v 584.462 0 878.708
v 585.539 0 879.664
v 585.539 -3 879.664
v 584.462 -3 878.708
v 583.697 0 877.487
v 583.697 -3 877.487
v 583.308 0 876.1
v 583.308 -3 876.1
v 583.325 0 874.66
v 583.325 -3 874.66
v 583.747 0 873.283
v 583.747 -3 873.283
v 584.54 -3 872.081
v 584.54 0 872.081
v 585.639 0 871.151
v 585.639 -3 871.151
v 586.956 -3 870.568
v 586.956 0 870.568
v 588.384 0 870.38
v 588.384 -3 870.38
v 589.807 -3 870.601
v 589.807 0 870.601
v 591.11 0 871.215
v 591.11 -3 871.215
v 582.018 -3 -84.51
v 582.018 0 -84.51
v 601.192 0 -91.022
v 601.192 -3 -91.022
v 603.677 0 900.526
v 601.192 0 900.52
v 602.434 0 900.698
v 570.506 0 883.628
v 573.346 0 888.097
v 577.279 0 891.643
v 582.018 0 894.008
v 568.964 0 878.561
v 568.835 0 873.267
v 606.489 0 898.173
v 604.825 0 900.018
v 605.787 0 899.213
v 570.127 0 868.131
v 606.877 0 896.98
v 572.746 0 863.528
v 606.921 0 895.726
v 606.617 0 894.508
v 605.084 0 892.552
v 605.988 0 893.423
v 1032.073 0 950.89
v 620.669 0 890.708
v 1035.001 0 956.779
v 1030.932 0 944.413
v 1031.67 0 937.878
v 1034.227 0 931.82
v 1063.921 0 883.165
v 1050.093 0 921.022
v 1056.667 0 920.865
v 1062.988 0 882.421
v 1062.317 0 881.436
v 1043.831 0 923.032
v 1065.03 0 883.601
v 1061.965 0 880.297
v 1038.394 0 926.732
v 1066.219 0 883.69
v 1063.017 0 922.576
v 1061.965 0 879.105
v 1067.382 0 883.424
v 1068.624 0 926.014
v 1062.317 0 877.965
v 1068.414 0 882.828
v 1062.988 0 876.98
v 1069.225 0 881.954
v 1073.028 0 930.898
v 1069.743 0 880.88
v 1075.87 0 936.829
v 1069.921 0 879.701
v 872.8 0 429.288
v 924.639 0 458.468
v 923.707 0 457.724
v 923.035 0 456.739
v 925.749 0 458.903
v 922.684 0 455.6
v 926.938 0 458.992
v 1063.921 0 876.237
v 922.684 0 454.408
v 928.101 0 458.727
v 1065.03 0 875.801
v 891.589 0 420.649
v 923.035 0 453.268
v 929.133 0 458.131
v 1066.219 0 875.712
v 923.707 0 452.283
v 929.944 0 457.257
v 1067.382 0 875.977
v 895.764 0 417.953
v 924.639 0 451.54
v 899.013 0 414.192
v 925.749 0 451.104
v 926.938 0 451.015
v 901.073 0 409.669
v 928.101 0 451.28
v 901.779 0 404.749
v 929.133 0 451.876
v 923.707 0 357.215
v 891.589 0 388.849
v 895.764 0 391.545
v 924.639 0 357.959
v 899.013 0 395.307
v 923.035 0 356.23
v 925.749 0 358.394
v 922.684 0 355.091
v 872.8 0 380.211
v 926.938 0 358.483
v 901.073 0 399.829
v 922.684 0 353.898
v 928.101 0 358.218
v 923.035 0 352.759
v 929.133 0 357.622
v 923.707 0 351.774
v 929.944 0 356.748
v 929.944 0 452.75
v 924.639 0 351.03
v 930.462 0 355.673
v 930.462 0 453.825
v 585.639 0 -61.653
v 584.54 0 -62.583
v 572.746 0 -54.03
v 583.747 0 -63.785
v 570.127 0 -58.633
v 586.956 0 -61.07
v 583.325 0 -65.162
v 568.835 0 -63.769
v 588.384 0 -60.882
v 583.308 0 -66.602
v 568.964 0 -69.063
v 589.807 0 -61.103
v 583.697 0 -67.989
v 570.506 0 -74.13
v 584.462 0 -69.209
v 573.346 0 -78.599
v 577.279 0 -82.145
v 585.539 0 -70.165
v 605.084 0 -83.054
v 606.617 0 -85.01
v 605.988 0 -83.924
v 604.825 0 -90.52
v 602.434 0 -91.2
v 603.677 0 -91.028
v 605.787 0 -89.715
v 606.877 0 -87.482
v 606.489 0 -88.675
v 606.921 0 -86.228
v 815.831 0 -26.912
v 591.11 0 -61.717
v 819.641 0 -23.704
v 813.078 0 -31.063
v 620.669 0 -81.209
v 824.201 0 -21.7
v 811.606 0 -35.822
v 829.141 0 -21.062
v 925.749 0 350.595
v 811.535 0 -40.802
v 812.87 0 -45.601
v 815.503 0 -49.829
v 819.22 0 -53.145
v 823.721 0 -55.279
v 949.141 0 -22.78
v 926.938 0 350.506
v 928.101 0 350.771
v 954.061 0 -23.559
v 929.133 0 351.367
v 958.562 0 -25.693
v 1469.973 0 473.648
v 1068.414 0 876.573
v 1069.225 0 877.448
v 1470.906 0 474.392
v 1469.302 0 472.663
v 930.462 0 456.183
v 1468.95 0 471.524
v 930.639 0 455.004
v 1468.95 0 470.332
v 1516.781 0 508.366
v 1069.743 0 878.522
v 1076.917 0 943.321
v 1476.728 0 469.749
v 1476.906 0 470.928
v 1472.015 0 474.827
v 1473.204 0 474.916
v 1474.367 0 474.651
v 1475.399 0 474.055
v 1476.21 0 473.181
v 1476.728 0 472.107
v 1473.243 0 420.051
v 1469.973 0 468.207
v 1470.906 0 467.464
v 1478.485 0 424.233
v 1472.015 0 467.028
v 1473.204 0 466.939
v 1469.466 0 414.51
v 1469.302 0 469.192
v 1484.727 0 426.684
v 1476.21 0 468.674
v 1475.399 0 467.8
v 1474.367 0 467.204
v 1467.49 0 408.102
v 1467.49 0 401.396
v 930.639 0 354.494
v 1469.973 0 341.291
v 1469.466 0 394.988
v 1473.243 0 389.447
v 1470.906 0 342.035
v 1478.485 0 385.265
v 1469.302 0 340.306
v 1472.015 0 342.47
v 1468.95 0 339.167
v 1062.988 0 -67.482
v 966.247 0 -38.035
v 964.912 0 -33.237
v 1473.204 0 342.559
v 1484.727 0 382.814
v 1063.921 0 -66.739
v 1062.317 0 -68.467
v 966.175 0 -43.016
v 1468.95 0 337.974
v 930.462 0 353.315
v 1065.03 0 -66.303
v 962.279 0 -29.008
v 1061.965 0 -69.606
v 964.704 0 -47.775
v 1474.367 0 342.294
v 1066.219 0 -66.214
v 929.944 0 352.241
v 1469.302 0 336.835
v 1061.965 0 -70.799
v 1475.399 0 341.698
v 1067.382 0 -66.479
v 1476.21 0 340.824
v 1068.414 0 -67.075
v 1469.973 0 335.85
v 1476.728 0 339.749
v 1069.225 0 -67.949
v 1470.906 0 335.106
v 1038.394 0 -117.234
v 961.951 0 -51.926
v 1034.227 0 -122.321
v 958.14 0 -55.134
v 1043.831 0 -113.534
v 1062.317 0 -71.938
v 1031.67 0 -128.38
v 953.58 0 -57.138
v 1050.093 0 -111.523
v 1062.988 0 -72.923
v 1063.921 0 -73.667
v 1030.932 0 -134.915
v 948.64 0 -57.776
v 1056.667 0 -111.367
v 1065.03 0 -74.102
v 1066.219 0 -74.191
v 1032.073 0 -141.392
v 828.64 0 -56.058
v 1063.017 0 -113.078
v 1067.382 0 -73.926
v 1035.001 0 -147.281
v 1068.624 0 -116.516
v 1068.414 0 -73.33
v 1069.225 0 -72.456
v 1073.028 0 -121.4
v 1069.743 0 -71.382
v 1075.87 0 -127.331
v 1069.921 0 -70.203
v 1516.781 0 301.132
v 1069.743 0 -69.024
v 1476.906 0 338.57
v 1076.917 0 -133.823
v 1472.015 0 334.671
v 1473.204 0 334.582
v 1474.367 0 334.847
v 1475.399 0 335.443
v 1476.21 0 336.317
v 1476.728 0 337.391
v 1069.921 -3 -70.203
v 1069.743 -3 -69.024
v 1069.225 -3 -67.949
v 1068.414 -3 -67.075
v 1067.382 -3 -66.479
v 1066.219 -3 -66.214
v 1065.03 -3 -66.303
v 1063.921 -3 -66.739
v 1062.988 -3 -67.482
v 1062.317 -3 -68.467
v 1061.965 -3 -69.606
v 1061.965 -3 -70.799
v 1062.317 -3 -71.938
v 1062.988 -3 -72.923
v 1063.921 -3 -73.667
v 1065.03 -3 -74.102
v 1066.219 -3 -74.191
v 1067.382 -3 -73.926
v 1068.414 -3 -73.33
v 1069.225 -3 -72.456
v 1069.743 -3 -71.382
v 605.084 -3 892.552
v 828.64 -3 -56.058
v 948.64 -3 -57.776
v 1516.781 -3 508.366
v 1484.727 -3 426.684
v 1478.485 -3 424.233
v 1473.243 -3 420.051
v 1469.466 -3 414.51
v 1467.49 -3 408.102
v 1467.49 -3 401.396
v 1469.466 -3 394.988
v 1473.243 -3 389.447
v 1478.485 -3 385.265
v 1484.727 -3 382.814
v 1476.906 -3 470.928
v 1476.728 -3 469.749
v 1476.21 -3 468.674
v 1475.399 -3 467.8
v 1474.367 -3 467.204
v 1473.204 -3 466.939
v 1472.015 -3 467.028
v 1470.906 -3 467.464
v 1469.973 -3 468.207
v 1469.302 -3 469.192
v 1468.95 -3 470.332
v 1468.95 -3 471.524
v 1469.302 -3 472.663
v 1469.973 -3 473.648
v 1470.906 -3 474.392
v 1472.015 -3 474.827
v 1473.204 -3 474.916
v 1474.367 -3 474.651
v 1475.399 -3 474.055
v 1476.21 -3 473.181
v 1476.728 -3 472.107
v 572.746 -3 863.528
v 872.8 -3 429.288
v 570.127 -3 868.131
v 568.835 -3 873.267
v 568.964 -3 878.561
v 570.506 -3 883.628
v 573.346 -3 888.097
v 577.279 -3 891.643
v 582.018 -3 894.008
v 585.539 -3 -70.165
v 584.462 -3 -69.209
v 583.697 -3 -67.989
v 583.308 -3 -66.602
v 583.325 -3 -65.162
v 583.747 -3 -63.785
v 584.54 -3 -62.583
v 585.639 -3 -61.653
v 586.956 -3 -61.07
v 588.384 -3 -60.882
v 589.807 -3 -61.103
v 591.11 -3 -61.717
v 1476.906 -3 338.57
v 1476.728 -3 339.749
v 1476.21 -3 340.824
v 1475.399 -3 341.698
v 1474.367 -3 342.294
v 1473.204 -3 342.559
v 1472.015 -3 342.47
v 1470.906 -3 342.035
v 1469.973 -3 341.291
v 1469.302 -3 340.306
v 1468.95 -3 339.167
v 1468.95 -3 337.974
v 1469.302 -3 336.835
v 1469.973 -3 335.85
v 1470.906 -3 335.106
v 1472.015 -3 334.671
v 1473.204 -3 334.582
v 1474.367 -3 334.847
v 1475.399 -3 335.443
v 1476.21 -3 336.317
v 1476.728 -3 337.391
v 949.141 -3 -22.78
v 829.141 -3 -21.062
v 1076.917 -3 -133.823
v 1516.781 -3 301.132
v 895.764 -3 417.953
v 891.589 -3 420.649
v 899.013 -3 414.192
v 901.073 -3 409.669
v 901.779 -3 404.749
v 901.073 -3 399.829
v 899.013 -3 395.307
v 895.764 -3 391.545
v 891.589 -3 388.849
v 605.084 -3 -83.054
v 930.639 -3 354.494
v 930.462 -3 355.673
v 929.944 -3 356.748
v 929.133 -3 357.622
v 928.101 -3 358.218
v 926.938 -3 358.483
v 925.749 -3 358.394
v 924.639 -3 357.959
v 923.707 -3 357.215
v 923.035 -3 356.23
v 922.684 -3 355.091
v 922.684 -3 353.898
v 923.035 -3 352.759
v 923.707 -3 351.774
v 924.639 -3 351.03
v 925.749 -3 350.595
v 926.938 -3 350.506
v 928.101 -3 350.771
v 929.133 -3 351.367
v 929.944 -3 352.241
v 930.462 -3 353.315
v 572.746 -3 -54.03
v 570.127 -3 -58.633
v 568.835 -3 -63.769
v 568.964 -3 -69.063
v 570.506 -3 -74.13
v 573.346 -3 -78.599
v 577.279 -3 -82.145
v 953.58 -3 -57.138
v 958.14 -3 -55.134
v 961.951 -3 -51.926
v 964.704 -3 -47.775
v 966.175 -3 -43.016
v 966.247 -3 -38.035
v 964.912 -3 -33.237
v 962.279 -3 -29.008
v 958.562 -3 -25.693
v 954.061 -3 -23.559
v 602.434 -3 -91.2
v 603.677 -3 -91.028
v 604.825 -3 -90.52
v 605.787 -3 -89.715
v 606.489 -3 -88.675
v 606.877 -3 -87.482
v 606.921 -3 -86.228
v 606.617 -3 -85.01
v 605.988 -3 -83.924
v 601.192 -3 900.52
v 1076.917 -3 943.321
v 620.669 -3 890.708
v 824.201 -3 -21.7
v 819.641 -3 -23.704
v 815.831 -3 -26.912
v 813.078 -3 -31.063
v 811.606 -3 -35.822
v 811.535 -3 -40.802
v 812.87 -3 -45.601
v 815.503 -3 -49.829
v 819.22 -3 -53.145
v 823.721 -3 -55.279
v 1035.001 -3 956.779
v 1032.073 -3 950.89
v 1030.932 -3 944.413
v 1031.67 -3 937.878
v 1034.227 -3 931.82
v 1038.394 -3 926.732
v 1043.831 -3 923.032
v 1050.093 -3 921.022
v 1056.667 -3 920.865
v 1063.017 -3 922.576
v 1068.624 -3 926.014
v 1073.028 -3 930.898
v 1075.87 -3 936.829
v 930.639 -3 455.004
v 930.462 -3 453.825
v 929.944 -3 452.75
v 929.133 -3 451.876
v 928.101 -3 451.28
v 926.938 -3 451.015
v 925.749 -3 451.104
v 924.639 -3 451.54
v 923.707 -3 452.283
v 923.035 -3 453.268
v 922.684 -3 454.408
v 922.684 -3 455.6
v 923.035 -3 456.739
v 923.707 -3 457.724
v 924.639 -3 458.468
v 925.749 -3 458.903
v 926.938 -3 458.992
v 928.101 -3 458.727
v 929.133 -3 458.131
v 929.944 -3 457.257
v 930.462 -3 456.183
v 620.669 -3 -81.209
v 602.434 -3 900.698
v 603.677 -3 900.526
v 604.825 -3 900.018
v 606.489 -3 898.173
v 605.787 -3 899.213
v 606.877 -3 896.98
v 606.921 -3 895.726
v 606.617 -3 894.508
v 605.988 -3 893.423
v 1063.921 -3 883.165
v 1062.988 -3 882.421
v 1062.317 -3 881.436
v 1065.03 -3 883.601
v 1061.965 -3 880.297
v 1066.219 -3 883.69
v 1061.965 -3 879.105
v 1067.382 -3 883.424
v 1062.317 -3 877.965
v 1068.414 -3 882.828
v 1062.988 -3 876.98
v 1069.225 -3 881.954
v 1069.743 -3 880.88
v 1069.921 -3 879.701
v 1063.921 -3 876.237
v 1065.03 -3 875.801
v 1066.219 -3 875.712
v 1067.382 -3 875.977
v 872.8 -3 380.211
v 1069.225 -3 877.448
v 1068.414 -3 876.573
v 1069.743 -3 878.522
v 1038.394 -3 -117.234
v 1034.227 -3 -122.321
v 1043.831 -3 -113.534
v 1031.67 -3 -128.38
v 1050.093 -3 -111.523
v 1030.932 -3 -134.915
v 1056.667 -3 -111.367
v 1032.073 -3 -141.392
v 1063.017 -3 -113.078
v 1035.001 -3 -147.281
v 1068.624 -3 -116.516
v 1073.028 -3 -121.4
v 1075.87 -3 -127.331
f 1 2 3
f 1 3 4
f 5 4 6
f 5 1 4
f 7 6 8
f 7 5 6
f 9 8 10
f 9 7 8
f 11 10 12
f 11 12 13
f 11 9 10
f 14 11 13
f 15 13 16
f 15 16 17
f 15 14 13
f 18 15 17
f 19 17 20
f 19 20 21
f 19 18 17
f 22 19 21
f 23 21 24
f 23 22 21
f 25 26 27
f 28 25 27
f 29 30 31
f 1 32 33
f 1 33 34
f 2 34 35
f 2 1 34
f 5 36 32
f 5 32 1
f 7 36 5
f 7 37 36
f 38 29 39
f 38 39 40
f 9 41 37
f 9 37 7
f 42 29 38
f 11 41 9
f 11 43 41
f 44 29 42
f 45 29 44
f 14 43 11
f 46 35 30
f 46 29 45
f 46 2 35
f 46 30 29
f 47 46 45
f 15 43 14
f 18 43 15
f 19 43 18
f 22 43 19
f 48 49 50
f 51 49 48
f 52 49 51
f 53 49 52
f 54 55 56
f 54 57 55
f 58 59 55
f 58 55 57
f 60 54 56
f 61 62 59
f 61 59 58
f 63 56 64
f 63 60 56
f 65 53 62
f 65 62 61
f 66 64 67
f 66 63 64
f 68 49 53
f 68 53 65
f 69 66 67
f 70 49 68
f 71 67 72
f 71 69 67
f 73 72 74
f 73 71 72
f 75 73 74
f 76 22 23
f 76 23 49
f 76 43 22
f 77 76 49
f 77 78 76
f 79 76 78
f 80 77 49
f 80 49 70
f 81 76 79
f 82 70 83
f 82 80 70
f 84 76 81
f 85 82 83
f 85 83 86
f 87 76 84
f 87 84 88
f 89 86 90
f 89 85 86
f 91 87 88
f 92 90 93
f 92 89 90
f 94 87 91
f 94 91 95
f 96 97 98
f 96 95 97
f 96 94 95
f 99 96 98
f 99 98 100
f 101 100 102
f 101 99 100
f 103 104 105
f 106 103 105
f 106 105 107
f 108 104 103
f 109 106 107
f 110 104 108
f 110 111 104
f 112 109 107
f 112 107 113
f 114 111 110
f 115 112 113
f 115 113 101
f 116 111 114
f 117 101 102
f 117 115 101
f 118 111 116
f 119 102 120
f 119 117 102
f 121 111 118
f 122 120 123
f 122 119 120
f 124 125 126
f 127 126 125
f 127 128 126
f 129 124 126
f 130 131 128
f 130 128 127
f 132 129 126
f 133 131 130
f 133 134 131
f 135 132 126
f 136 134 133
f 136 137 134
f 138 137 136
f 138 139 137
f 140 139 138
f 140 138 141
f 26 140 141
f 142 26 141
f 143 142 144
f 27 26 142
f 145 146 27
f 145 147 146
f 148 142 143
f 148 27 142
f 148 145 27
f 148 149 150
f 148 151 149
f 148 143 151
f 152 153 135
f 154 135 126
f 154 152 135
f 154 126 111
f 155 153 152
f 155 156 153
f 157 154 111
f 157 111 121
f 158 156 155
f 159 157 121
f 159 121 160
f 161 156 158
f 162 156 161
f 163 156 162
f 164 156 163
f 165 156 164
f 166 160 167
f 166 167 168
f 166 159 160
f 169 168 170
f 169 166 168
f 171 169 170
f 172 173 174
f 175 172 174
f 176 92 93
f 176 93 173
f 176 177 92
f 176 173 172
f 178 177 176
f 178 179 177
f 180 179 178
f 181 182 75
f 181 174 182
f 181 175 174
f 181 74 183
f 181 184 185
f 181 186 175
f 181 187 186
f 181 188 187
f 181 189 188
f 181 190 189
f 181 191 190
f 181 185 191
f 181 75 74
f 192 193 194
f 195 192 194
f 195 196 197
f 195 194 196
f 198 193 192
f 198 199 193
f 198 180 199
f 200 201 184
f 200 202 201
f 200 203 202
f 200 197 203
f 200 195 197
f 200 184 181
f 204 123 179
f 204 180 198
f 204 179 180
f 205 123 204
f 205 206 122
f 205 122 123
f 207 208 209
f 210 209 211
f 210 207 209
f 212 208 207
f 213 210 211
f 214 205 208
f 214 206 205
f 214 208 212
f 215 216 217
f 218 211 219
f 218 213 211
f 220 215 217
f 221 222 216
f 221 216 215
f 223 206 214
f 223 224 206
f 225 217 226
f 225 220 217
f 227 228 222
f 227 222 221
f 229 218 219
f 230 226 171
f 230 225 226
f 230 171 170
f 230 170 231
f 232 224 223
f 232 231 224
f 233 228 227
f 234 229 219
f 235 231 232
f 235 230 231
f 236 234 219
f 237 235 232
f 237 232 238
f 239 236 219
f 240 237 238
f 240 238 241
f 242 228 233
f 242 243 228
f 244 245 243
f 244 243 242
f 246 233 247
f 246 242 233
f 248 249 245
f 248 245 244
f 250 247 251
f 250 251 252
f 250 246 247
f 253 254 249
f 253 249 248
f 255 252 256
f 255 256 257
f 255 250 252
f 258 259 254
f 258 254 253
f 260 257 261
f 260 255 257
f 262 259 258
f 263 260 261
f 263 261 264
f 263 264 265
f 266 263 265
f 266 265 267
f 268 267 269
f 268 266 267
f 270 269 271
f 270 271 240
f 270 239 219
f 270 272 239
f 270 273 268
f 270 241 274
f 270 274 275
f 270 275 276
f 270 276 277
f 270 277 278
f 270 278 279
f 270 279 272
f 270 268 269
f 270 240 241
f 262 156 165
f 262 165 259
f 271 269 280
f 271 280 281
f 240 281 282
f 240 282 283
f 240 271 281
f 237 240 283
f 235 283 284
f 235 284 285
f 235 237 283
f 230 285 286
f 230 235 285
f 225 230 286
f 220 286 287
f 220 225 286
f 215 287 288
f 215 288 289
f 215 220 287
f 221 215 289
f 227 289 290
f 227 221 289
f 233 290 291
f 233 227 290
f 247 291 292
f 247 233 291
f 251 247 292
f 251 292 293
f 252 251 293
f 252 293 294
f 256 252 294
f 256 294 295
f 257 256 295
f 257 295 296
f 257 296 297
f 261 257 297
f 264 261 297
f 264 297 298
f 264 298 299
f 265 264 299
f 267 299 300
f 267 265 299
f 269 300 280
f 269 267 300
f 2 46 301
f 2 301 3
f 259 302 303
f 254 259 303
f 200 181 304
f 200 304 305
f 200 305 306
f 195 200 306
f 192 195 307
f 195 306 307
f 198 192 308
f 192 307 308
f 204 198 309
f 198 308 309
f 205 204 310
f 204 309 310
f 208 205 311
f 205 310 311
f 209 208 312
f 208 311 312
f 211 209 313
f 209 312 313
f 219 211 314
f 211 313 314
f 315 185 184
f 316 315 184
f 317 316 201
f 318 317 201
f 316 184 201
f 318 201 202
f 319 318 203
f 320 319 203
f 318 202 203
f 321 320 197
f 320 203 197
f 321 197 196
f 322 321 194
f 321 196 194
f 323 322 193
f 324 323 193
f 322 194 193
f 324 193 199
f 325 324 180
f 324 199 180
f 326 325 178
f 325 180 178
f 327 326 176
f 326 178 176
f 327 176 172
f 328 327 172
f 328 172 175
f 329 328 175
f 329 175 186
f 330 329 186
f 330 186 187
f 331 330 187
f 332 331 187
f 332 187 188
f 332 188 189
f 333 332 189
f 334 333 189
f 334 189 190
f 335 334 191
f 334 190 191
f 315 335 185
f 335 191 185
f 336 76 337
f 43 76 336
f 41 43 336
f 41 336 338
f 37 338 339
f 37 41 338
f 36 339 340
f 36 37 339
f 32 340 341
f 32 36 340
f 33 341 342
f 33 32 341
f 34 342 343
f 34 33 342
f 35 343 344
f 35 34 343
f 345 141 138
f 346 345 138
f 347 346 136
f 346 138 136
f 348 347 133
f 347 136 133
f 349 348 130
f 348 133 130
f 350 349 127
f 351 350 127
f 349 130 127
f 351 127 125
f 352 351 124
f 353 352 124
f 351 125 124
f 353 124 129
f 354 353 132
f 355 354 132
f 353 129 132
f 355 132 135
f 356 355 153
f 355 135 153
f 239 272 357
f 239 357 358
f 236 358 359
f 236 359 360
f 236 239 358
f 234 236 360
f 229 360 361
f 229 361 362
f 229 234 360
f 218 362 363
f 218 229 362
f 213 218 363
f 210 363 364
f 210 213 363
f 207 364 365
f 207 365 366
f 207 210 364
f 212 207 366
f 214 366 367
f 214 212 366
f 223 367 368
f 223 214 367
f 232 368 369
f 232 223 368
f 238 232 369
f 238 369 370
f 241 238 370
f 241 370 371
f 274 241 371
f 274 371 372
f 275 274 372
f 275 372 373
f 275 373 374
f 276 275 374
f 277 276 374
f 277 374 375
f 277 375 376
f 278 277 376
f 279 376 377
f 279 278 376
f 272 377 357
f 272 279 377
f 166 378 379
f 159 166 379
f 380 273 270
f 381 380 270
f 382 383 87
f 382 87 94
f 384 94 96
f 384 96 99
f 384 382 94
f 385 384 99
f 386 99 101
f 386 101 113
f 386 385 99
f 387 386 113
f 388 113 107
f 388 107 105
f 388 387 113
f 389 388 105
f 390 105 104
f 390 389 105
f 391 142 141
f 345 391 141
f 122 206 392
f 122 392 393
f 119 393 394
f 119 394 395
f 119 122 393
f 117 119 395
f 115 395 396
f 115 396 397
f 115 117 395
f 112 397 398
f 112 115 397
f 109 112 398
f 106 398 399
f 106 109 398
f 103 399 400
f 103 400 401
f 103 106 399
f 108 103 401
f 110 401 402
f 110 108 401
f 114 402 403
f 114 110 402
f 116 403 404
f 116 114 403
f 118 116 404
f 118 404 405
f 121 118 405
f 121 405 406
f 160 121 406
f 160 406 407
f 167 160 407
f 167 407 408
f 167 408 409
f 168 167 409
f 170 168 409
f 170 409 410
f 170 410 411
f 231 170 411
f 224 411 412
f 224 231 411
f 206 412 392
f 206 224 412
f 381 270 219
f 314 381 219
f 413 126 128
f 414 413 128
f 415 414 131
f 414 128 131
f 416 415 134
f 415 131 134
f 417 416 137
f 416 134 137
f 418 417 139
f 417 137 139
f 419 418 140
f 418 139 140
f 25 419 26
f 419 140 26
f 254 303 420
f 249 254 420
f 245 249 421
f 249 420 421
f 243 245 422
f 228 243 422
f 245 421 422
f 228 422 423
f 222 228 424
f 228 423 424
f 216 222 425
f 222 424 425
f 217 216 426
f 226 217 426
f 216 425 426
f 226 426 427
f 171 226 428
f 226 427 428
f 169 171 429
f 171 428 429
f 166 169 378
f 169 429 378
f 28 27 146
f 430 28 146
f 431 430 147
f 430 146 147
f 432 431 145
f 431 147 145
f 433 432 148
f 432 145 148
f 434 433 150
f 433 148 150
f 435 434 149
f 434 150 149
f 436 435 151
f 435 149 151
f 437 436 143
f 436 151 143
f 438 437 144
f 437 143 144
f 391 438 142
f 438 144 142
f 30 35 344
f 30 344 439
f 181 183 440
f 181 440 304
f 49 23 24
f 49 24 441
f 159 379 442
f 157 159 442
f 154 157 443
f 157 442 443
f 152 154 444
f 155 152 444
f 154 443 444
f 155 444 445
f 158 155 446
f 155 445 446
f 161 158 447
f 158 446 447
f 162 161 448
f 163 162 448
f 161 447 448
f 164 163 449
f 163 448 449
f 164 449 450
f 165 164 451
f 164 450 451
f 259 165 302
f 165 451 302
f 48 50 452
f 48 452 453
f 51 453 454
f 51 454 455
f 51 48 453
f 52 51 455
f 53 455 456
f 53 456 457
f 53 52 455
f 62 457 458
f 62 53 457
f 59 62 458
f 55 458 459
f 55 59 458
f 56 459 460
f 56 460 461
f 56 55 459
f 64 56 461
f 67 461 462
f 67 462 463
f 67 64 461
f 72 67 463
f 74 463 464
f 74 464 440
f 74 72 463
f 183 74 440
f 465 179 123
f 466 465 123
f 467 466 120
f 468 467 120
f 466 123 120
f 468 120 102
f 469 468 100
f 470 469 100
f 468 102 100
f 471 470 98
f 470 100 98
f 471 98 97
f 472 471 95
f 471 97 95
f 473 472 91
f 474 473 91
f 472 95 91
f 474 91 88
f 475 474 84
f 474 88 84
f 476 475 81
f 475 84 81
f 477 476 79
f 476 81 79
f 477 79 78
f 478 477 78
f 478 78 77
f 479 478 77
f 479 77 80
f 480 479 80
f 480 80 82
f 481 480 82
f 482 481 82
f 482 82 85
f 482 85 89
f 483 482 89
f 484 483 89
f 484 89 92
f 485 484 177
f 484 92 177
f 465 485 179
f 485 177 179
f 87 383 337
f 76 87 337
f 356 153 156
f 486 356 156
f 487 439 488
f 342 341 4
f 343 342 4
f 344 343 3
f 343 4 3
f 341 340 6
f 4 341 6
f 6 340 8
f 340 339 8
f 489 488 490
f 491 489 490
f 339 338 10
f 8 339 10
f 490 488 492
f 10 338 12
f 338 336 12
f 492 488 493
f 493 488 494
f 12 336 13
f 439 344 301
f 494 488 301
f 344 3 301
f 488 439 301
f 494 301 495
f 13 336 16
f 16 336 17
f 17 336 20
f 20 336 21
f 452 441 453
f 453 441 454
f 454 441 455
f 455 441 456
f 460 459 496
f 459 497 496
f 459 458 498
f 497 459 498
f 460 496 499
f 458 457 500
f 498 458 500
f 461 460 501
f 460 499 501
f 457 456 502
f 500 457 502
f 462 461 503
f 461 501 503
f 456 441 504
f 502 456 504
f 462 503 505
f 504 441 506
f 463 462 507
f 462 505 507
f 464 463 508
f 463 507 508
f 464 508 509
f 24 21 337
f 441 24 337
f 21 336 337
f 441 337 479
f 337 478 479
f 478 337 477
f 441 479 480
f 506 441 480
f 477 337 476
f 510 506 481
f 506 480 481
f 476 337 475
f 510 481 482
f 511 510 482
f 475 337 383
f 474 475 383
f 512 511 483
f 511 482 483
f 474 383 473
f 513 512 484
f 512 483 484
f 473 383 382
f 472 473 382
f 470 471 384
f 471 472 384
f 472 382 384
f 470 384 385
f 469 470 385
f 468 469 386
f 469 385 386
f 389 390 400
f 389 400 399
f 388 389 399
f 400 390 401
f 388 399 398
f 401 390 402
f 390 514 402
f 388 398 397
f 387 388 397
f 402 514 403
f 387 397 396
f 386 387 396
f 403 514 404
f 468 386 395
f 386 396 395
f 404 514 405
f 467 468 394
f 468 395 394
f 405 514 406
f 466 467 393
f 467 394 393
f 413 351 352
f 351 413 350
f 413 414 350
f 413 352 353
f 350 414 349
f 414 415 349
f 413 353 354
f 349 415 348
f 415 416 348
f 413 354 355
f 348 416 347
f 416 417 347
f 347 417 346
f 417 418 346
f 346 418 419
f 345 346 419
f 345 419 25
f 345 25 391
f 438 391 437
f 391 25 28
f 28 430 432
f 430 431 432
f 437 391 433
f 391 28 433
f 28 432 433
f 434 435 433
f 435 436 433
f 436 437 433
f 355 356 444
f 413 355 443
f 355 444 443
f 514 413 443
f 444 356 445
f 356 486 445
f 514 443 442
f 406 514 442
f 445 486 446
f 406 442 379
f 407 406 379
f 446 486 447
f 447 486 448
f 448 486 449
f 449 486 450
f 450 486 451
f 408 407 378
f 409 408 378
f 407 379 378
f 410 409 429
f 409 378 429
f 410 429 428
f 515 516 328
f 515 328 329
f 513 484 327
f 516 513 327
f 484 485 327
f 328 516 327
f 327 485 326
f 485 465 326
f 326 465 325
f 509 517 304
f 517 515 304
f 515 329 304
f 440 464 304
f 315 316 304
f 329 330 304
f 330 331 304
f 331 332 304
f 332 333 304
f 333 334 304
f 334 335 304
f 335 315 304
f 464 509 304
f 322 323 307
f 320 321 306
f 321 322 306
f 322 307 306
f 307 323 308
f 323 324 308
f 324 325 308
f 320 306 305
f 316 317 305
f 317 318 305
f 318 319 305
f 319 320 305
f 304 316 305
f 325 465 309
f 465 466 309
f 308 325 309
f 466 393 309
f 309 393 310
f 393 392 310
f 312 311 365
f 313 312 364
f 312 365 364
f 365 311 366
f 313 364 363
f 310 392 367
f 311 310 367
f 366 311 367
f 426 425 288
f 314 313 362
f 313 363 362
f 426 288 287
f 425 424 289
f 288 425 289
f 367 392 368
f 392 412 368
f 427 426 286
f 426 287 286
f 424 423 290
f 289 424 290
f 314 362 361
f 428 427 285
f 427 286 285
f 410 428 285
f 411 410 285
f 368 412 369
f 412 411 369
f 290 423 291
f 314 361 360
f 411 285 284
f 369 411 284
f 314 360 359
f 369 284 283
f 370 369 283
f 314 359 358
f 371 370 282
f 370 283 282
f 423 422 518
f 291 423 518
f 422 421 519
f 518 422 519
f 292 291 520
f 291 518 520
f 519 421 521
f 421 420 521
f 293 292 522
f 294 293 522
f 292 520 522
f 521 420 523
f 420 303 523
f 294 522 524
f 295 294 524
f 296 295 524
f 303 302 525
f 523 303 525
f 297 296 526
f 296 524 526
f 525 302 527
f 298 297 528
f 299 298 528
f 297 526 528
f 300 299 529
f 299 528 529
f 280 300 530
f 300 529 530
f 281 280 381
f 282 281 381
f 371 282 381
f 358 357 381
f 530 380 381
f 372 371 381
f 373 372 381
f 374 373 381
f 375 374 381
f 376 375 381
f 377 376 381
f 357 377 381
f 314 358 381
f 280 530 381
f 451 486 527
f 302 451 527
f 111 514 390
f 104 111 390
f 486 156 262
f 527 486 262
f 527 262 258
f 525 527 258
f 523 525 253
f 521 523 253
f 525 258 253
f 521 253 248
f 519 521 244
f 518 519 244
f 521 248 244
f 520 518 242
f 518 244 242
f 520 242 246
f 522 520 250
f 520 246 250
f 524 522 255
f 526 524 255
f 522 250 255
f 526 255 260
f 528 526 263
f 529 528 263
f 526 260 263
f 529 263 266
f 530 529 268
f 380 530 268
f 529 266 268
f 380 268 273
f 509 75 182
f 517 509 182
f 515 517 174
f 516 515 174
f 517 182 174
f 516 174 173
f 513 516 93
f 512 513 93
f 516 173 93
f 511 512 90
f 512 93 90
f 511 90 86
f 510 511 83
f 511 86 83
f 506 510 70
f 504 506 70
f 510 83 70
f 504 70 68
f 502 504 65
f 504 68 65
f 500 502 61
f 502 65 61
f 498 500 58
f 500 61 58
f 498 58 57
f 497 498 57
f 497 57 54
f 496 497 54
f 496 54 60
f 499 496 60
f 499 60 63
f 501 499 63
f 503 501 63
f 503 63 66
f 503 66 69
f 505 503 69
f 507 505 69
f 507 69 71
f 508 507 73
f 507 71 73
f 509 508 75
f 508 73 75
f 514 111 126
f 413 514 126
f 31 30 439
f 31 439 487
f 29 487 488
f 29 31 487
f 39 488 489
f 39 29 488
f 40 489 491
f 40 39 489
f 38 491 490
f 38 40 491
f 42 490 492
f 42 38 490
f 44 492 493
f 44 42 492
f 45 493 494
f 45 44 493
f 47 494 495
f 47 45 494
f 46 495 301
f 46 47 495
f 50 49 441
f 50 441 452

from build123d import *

# Parameters (mm, degrees)
F0_R     = 4
F1_DEPTH = 3
F5_DEPTH = 3
F8_DEPTH = 25
F9_DEPTH = 25


# Not quite as in the source:
# - ends of sketch curves that miss each other by under 0.0002 mm in the source are joined


with BuildPart() as f1:
    # F0 (on Front) → F1 (new body)
    with BuildSketch(Plane.XZ):
        with BuildLine():
            ThreePointArc((585.5387718609, -70.1653972109), (584.1001986375, -63.1555680907), (591.1100276795, -61.716994486))
            Line((591.1100276795, -61.716994486), (620.6688569888, -81.2094156242))
            Line((620.6688569888, -81.2094156242), (1035.0006136748, -147.2807863546))
            ThreePointArc((1035.0006136748, -147.2807863546), (1046.8897667562, -112.3036113444), (1076.917388022, -133.8232928895))
            Line((1076.917388022, -133.8232928895), (1516.7807656982, 301.1320483365))
            Line((1516.7807656982, 301.1320483365), (1482.3585617346, 388.849064))
            Line((1482.3585617346, 388.849064), (878.7694007197, 388.849064))
            Line((878.7694007197, 388.849064), (572.7458963991, -54.0303683051))
            ThreePointArc((572.7458963991, -54.0303683051), (569.563169725, -71.6485447179), (582.0179839674, -84.5096290961))
            Line((582.0179839674, -84.5096290961), (601.192342, -91.021836))
            ThreePointArc((601.192342, -91.021836), (606.4892645676, -88.6748164062), (605.0838007766, -83.0542683087))
            Line((605.0838007766, -83.0542683087), (585.5387718609, -70.1653972109))
        make_face()
        with Locations((1065.920517, -70.202665)):
            Circle(F0_R, mode=Mode.SUBTRACT)
        with Locations((926.6393642448, 354.4944504476)):
            Circle(F0_R, mode=Mode.SUBTRACT)
        with Locations((1472.9055166245, 338.570445776)):
            Circle(F0_R, mode=Mode.SUBTRACT)
    extrude(amount=F1_DEPTH)


with BuildPart() as f3_1:
    # F3: instance of F1
    add(f1.part.mirror(Plane(origin=(1180.5639812271, -1.5, 404.749064), x_dir=(1, 0, 0), z_dir=(0, 0, 1))))


with BuildPart() as f1_1:
    add(f1.part)

    add(f3_1.part)  # F5 merges F3_1
    # F4 (on face) → F5 (join, through all)
    with BuildSketch(Plane.XZ.offset(3)):
        with BuildLine():
            ThreePointArc((1473.8185102428, 388.849064), (1467.2383092365, 404.749064), (1473.8185102428, 420.649064))
            Line((1473.8185102428, 420.649064), (891.5892198284, 420.649064))
            ThreePointArc((891.5892198284, 420.649064), (901.7789530754, 404.749064), (891.5892198284, 388.849064))
            Line((891.5892198284, 388.849064), (1473.8185102428, 388.849064))
        make_face()
    extrude(amount=-F5_DEPTH)

    # F7 (on face) → F8 (cut)
    with BuildSketch(Plane.XZ.offset(3)):
        with BuildLine():
            Line((949.1413939246, -22.7795250632), (829.1413939246, -21.0615598373))
            ThreePointArc((829.1413939246, -21.0615598373), (811.3926761125, -38.3092558002), (828.6403720754, -56.0579736122))
            Line((828.6403720754, -56.0579736122), (948.6403720754, -57.7759388381))
            ThreePointArc((948.6403720754, -57.7759388381), (966.3890898875, -40.5282428752), (949.1413939246, -22.7795250632))
        make_face()
    extrude(amount=-F8_DEPTH, mode=Mode.SUBTRACT)

    # F6 (on face) → F9 (cut)
    with BuildSketch(Plane.XZ.offset(3)):
        with BuildLine():
            ThreePointArc((891.5892198284, 388.849064), (901.7789530754, 404.749064), (891.5892198284, 420.649064))
            Line((891.5892198284, 420.649064), (872.8003346685, 429.2875396296))
            Line((872.8003346685, 429.2875396296), (872.8003346685, 380.2105883704))
            Line((872.8003346685, 380.2105883704), (891.5892198284, 388.849064))
        make_face()
        with BuildLine():
            Line((1484.726747317, 382.814291443), (1484.726747317, 426.683836557))
            ThreePointArc((1484.726747317, 426.683836557), (1467.2383092365, 404.749064), (1484.726747317, 382.814291443))
        make_face()
    extrude(amount=-F9_DEPTH, mode=Mode.SUBTRACT)


solid = f1_1.part
